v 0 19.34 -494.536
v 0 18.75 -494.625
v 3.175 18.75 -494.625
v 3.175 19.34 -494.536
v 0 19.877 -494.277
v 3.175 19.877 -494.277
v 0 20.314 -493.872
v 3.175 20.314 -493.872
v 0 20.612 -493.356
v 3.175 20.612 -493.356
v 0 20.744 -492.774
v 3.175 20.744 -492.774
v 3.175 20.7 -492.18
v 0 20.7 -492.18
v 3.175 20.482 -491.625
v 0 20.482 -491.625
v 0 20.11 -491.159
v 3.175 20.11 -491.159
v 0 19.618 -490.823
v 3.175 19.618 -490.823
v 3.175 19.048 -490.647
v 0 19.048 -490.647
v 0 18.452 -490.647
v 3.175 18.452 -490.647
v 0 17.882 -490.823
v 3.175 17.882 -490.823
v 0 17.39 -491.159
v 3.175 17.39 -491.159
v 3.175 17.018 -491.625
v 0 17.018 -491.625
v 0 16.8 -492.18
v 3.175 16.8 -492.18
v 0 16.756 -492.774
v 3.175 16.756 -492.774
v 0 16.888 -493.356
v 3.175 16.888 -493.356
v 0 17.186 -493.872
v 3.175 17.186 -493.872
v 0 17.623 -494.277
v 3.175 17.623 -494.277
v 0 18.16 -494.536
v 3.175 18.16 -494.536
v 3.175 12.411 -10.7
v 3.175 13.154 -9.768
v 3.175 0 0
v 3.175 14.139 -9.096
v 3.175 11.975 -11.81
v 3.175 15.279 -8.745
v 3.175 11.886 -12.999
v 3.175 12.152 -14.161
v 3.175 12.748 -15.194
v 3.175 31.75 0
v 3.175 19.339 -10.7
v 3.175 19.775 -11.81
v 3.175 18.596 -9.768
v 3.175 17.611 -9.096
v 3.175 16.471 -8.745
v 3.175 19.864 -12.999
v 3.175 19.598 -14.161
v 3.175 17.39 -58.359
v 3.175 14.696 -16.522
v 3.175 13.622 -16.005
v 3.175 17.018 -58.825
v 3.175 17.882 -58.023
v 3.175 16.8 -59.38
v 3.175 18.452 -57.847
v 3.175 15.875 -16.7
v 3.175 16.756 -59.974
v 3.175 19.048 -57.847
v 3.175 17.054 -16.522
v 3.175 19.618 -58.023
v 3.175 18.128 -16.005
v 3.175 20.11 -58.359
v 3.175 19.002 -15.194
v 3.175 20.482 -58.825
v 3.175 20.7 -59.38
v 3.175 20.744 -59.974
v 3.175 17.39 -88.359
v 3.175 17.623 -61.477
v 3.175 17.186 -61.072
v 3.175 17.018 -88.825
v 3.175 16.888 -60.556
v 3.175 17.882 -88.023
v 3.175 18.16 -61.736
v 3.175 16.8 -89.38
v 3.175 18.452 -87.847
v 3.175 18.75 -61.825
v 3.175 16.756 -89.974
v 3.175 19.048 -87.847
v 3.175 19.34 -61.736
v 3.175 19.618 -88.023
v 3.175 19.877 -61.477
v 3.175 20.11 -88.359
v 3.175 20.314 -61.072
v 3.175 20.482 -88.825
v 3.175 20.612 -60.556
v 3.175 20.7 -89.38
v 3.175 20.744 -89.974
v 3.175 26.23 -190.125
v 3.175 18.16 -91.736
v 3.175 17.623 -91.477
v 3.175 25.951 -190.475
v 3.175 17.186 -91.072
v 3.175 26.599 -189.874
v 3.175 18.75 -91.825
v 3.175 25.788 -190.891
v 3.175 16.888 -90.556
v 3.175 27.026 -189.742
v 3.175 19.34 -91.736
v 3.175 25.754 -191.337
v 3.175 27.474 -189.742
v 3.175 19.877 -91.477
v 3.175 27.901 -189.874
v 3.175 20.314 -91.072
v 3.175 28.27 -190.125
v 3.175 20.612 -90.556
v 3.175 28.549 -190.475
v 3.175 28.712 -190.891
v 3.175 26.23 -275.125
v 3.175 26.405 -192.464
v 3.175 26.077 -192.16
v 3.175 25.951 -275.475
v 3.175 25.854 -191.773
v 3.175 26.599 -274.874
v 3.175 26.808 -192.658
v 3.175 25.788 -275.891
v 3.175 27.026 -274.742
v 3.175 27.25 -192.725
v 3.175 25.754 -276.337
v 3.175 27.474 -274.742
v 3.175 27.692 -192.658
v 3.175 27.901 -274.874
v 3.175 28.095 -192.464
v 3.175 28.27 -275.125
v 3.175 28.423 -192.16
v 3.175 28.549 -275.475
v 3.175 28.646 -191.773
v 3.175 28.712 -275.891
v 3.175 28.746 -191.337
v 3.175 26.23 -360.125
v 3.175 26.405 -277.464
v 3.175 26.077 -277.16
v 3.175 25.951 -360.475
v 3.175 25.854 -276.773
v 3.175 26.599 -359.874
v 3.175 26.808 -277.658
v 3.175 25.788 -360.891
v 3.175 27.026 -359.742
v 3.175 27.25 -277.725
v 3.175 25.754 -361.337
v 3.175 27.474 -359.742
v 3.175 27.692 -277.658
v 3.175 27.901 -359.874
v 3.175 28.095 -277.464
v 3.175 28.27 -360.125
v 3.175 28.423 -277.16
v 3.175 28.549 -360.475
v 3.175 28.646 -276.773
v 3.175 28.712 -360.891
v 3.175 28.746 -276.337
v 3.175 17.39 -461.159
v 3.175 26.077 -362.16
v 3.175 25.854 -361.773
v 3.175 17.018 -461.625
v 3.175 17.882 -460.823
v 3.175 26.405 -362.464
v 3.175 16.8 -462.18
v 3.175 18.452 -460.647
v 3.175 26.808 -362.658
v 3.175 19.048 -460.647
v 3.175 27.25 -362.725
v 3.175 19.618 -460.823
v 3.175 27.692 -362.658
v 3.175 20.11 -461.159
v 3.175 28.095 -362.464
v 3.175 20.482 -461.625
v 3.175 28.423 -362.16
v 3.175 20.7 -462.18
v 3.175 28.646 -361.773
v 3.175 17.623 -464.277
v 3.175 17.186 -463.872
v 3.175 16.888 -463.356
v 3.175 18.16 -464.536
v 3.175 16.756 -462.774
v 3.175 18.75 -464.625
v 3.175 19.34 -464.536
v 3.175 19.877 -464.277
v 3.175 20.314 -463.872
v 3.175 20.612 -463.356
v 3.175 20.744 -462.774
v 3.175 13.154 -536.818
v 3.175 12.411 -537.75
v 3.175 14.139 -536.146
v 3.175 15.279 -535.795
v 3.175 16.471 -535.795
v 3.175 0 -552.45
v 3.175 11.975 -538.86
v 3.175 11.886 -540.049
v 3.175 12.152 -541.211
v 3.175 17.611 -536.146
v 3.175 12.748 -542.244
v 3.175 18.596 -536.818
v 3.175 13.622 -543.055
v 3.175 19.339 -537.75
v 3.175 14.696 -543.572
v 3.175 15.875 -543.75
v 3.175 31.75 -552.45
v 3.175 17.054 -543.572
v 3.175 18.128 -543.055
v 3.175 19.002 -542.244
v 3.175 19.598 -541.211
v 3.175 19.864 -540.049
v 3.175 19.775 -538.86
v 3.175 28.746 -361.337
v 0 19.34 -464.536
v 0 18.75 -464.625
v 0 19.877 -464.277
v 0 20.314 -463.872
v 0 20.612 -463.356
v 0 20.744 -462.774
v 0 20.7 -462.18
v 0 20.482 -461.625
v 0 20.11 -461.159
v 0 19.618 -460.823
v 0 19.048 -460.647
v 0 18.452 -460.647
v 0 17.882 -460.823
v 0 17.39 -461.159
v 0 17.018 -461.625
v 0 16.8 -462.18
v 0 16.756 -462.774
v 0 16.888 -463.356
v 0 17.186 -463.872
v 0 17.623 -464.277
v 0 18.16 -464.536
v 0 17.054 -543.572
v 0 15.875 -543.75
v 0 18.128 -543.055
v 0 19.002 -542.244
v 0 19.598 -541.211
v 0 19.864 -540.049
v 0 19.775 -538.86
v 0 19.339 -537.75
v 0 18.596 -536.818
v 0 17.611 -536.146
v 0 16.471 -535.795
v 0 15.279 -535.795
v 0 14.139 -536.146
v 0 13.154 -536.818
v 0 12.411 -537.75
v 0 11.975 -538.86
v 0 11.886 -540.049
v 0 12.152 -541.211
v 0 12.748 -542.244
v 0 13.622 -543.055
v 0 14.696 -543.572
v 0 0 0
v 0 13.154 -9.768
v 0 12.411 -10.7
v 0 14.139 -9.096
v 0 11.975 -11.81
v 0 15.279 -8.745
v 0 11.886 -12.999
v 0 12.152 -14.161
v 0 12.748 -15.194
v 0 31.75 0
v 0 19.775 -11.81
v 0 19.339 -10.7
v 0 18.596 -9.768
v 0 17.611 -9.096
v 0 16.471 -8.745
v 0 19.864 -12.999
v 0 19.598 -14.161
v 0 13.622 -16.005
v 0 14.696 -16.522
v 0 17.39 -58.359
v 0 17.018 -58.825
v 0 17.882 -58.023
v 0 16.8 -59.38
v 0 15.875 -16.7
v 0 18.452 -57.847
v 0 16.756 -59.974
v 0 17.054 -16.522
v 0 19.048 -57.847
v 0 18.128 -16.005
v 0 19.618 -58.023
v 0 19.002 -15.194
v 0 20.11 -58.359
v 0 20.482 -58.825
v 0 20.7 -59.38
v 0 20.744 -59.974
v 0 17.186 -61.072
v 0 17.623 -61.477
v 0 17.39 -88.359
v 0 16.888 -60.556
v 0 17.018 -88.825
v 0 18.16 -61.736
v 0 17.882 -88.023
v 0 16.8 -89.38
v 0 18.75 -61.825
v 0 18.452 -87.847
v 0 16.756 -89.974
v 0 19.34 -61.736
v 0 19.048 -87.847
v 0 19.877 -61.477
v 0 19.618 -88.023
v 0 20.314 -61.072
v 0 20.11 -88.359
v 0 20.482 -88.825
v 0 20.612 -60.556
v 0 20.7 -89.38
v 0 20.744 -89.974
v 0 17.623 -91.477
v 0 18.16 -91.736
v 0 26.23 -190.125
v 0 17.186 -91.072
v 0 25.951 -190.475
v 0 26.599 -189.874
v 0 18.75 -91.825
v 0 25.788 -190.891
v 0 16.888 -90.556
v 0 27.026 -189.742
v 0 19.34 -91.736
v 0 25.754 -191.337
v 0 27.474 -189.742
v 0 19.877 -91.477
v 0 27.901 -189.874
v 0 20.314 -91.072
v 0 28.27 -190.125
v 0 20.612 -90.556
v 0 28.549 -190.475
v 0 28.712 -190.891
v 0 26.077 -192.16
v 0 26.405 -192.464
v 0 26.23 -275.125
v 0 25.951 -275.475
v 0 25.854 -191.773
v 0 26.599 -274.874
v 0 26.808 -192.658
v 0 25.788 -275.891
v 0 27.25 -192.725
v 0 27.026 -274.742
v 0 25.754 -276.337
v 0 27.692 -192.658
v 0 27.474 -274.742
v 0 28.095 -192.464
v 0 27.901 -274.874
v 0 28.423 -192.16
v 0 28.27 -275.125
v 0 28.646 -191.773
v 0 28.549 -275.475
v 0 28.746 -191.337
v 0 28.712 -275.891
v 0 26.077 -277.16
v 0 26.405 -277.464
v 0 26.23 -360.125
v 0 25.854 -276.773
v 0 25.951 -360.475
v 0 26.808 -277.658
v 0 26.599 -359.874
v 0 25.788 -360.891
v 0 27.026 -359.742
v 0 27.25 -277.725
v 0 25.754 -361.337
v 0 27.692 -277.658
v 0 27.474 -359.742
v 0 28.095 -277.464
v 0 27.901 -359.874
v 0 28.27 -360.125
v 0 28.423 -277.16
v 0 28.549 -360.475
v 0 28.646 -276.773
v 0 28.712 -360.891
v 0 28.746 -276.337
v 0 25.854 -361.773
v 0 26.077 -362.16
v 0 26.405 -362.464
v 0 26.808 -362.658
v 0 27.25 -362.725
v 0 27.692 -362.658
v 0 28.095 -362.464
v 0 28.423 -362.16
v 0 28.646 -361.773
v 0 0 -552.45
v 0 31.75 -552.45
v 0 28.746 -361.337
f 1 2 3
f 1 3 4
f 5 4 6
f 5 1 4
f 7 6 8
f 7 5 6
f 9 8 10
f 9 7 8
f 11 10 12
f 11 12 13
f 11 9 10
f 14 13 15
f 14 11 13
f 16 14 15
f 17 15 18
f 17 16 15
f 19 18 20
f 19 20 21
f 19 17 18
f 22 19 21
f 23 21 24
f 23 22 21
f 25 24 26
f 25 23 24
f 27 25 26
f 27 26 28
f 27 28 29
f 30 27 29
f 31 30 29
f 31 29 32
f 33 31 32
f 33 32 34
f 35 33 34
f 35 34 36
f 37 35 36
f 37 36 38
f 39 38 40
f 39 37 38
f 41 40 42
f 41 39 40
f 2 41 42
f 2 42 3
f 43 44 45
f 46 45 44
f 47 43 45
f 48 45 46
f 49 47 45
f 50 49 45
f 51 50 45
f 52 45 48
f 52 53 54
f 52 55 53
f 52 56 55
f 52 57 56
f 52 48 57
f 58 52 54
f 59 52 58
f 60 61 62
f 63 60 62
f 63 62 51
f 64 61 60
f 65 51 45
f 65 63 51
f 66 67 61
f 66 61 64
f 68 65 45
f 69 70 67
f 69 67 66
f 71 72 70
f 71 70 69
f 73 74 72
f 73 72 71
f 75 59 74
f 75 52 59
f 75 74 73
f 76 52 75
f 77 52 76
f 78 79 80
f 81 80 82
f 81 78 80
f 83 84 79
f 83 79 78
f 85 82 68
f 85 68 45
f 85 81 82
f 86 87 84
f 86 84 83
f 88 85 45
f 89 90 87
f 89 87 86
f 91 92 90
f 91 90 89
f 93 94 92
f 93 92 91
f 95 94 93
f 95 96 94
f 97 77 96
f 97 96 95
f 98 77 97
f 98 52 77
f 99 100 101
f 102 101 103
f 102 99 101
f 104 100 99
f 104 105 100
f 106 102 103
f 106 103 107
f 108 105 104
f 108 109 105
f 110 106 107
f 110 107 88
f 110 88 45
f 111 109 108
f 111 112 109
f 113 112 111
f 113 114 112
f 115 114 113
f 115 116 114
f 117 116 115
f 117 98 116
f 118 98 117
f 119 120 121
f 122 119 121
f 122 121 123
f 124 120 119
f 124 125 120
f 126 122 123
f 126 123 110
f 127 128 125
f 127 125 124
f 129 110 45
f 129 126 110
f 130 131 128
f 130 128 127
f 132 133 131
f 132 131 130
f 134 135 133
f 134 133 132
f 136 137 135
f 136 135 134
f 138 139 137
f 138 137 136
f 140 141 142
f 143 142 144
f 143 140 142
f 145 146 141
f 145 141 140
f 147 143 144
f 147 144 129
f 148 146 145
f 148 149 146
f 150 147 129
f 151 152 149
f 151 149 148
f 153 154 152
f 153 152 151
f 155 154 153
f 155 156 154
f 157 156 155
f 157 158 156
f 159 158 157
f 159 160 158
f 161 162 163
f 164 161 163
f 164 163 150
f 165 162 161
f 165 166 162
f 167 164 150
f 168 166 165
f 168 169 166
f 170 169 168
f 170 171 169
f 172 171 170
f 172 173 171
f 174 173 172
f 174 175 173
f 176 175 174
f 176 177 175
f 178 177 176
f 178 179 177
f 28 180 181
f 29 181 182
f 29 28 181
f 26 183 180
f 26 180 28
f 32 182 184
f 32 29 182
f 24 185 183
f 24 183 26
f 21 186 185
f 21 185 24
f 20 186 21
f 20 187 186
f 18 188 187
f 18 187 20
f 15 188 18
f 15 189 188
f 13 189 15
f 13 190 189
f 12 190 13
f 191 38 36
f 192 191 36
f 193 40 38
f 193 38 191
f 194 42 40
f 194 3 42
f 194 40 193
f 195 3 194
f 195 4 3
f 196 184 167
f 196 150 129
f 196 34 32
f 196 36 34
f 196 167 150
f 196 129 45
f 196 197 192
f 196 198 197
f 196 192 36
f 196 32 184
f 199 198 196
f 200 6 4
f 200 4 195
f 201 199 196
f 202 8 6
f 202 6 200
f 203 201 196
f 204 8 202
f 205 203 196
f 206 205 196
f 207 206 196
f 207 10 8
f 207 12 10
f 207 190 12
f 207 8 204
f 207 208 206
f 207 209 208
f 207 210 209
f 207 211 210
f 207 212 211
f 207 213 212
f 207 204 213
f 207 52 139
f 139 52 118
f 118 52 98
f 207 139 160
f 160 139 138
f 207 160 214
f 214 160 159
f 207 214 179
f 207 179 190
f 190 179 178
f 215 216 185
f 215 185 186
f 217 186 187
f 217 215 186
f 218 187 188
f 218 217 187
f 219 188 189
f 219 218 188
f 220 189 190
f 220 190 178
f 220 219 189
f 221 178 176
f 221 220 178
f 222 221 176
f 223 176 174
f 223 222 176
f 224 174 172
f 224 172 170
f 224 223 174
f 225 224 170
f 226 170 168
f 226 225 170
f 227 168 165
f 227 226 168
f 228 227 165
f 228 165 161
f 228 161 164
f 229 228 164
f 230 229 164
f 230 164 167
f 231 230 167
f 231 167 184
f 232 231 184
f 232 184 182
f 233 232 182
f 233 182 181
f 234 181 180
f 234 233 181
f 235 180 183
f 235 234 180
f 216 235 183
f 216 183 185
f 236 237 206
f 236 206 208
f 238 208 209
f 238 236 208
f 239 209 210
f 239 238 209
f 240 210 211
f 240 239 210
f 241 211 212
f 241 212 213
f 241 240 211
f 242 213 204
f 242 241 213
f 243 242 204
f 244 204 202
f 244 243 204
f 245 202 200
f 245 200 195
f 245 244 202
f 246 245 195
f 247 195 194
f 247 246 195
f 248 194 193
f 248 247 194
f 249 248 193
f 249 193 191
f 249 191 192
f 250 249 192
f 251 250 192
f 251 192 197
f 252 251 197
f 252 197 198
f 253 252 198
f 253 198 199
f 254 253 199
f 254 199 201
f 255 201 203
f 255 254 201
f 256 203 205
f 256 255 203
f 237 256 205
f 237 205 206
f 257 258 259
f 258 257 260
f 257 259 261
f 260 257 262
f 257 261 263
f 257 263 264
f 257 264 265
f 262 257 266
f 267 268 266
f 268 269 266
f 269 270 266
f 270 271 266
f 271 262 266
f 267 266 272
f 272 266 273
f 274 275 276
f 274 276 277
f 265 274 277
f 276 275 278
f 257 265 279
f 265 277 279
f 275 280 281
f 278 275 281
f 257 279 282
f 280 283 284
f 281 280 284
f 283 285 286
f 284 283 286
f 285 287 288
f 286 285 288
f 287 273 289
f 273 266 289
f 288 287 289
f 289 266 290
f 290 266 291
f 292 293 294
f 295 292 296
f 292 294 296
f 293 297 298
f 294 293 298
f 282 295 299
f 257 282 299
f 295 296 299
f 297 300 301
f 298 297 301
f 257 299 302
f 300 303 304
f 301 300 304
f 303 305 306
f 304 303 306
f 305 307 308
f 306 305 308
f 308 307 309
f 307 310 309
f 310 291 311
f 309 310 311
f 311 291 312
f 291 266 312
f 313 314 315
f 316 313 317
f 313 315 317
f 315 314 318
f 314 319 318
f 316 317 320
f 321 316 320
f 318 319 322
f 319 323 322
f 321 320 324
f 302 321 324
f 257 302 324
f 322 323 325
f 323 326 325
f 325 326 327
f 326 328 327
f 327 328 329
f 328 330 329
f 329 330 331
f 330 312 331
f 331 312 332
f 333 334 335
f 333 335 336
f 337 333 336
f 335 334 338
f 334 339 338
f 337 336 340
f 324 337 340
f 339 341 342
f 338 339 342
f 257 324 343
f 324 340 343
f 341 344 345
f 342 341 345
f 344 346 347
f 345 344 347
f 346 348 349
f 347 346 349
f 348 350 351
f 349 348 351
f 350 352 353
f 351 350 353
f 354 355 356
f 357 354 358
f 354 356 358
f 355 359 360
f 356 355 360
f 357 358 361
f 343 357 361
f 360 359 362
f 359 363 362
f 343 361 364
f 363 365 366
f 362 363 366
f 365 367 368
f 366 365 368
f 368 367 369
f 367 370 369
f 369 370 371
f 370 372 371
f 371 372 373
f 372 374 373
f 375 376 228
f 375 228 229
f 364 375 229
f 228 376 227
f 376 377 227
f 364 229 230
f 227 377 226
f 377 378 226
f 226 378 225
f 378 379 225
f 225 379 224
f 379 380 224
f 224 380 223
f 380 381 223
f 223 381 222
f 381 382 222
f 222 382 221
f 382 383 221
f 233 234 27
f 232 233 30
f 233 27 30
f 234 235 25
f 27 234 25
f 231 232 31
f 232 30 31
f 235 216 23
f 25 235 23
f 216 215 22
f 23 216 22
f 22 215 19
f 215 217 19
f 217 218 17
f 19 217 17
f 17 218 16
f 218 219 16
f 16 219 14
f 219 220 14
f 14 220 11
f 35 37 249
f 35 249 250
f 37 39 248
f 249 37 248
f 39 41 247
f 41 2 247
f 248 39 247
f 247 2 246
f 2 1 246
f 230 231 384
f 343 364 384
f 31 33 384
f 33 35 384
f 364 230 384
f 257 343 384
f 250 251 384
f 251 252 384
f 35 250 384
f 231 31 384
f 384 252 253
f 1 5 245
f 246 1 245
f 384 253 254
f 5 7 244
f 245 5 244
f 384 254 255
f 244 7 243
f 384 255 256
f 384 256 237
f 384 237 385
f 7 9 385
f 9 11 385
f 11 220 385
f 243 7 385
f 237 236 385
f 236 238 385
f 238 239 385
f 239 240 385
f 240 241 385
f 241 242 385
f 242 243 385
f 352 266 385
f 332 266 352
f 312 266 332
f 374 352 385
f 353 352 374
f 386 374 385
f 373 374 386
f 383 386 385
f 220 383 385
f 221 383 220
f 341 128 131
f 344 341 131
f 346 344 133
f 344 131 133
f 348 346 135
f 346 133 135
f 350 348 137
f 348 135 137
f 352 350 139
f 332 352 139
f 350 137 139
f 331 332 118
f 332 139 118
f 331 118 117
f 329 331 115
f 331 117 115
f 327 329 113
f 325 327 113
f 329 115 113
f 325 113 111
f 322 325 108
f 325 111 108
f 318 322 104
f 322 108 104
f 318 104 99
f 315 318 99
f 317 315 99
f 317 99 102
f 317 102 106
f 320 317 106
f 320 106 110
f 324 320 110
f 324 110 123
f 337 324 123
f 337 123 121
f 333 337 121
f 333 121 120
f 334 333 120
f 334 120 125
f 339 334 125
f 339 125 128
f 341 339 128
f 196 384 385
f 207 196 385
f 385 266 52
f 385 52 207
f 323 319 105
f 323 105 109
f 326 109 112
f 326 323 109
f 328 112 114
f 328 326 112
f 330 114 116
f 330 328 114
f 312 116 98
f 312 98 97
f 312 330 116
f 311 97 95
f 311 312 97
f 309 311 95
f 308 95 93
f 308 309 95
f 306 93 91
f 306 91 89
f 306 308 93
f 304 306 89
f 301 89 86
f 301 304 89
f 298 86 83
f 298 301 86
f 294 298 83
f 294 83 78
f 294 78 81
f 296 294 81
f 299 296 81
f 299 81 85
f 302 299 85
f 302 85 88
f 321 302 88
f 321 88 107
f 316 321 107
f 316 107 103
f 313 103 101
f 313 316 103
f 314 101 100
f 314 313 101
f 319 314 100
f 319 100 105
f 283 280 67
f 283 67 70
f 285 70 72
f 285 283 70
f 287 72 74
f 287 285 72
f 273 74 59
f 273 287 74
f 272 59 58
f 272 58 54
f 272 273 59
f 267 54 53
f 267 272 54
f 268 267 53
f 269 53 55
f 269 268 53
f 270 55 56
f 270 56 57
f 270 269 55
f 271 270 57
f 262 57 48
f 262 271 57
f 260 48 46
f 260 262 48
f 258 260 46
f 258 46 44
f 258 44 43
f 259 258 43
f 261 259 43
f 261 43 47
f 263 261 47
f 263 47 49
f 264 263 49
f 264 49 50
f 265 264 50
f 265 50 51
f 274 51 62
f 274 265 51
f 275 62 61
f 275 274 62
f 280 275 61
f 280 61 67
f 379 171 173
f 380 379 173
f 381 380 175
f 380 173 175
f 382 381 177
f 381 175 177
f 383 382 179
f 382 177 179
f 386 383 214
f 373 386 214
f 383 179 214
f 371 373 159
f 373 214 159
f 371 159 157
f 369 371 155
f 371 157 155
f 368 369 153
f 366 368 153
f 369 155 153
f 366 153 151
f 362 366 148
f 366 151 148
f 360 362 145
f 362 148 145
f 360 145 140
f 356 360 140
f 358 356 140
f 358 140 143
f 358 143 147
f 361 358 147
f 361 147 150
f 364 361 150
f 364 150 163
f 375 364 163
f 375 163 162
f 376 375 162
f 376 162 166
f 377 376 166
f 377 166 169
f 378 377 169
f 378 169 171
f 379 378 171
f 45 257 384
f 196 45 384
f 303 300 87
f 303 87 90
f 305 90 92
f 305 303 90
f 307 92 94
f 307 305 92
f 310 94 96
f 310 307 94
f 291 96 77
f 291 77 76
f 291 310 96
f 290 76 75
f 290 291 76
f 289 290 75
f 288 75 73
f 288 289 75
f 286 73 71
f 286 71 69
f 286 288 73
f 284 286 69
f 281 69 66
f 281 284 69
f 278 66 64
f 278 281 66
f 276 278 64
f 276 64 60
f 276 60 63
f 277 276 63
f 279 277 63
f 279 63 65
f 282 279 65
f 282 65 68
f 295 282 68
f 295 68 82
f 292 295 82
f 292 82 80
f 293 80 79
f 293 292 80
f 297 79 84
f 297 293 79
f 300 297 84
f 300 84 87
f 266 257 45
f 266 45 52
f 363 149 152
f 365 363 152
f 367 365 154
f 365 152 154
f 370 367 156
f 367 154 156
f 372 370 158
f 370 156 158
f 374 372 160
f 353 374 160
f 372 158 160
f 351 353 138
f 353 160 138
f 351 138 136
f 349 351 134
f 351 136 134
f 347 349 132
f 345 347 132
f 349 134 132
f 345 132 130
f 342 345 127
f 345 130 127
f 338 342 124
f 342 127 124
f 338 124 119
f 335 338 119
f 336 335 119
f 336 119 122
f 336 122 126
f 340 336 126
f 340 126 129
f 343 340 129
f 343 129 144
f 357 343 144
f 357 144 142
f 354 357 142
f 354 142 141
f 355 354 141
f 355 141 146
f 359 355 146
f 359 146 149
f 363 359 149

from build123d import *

# Parameters (mm, degrees)
SKETCH1_W                                 = 552.45
SKETCH1_H                                 = 31.75
SKETCH1_R                                 = 4
SKETCH1_R_2                               = 2
BOSS_EXTRUDE2_DEPTH                       = 3.175
SKETCH2_R                                 = 1.5
LIGHTINGGUIDEMOUNTHOLESCUT_EXTRUDE1_DEPTH = 554.370712656


with BuildPart() as part:
    # Sketch1 → Boss-Extrude2 (new body)
    with BuildSketch(Plane(origin=(0, 0, 0), x_dir=(0, 0, -1), z_dir=(1, 0, 0))):
        with Locations((276.225, 15.875)):
            Rectangle(SKETCH1_W, SKETCH1_H)
        with Locations((12.7, 15.875)):
            Circle(SKETCH1_R, mode=Mode.SUBTRACT)
        with Locations((539.75, 15.875)):
            Circle(SKETCH1_R, mode=Mode.SUBTRACT)
        with Locations((462.625, 18.75)):
            Circle(SKETCH1_R_2, mode=Mode.SUBTRACT)
        with Locations((492.625, 18.75)):
            Circle(SKETCH1_R_2, mode=Mode.SUBTRACT)
        with Locations((59.825, 18.75)):
            Circle(SKETCH1_R_2, mode=Mode.SUBTRACT)
        with Locations((89.825, 18.75)):
            Circle(SKETCH1_R_2, mode=Mode.SUBTRACT)
    extrude(amount=BOSS_EXTRUDE2_DEPTH)

    # Sketch2 → LightingGuideMountHolesCut-Extrude1 (cut, through all)
    with BuildSketch(Plane(origin=(3.175, 0, 0), x_dir=(0, 0, -1), z_dir=(1, 0, 0))):
        with Locations((191.225, 27.25)):
            Circle(SKETCH2_R)
        with Locations((276.225, 27.25)):
            Circle(SKETCH2_R)
        with Locations((361.225, 27.25)):
            Circle(SKETCH2_R)
    extrude(amount=-LIGHTINGGUIDEMOUNTHOLESCUT_EXTRUDE1_DEPTH, mode=Mode.SUBTRACT)


solid = part.part
